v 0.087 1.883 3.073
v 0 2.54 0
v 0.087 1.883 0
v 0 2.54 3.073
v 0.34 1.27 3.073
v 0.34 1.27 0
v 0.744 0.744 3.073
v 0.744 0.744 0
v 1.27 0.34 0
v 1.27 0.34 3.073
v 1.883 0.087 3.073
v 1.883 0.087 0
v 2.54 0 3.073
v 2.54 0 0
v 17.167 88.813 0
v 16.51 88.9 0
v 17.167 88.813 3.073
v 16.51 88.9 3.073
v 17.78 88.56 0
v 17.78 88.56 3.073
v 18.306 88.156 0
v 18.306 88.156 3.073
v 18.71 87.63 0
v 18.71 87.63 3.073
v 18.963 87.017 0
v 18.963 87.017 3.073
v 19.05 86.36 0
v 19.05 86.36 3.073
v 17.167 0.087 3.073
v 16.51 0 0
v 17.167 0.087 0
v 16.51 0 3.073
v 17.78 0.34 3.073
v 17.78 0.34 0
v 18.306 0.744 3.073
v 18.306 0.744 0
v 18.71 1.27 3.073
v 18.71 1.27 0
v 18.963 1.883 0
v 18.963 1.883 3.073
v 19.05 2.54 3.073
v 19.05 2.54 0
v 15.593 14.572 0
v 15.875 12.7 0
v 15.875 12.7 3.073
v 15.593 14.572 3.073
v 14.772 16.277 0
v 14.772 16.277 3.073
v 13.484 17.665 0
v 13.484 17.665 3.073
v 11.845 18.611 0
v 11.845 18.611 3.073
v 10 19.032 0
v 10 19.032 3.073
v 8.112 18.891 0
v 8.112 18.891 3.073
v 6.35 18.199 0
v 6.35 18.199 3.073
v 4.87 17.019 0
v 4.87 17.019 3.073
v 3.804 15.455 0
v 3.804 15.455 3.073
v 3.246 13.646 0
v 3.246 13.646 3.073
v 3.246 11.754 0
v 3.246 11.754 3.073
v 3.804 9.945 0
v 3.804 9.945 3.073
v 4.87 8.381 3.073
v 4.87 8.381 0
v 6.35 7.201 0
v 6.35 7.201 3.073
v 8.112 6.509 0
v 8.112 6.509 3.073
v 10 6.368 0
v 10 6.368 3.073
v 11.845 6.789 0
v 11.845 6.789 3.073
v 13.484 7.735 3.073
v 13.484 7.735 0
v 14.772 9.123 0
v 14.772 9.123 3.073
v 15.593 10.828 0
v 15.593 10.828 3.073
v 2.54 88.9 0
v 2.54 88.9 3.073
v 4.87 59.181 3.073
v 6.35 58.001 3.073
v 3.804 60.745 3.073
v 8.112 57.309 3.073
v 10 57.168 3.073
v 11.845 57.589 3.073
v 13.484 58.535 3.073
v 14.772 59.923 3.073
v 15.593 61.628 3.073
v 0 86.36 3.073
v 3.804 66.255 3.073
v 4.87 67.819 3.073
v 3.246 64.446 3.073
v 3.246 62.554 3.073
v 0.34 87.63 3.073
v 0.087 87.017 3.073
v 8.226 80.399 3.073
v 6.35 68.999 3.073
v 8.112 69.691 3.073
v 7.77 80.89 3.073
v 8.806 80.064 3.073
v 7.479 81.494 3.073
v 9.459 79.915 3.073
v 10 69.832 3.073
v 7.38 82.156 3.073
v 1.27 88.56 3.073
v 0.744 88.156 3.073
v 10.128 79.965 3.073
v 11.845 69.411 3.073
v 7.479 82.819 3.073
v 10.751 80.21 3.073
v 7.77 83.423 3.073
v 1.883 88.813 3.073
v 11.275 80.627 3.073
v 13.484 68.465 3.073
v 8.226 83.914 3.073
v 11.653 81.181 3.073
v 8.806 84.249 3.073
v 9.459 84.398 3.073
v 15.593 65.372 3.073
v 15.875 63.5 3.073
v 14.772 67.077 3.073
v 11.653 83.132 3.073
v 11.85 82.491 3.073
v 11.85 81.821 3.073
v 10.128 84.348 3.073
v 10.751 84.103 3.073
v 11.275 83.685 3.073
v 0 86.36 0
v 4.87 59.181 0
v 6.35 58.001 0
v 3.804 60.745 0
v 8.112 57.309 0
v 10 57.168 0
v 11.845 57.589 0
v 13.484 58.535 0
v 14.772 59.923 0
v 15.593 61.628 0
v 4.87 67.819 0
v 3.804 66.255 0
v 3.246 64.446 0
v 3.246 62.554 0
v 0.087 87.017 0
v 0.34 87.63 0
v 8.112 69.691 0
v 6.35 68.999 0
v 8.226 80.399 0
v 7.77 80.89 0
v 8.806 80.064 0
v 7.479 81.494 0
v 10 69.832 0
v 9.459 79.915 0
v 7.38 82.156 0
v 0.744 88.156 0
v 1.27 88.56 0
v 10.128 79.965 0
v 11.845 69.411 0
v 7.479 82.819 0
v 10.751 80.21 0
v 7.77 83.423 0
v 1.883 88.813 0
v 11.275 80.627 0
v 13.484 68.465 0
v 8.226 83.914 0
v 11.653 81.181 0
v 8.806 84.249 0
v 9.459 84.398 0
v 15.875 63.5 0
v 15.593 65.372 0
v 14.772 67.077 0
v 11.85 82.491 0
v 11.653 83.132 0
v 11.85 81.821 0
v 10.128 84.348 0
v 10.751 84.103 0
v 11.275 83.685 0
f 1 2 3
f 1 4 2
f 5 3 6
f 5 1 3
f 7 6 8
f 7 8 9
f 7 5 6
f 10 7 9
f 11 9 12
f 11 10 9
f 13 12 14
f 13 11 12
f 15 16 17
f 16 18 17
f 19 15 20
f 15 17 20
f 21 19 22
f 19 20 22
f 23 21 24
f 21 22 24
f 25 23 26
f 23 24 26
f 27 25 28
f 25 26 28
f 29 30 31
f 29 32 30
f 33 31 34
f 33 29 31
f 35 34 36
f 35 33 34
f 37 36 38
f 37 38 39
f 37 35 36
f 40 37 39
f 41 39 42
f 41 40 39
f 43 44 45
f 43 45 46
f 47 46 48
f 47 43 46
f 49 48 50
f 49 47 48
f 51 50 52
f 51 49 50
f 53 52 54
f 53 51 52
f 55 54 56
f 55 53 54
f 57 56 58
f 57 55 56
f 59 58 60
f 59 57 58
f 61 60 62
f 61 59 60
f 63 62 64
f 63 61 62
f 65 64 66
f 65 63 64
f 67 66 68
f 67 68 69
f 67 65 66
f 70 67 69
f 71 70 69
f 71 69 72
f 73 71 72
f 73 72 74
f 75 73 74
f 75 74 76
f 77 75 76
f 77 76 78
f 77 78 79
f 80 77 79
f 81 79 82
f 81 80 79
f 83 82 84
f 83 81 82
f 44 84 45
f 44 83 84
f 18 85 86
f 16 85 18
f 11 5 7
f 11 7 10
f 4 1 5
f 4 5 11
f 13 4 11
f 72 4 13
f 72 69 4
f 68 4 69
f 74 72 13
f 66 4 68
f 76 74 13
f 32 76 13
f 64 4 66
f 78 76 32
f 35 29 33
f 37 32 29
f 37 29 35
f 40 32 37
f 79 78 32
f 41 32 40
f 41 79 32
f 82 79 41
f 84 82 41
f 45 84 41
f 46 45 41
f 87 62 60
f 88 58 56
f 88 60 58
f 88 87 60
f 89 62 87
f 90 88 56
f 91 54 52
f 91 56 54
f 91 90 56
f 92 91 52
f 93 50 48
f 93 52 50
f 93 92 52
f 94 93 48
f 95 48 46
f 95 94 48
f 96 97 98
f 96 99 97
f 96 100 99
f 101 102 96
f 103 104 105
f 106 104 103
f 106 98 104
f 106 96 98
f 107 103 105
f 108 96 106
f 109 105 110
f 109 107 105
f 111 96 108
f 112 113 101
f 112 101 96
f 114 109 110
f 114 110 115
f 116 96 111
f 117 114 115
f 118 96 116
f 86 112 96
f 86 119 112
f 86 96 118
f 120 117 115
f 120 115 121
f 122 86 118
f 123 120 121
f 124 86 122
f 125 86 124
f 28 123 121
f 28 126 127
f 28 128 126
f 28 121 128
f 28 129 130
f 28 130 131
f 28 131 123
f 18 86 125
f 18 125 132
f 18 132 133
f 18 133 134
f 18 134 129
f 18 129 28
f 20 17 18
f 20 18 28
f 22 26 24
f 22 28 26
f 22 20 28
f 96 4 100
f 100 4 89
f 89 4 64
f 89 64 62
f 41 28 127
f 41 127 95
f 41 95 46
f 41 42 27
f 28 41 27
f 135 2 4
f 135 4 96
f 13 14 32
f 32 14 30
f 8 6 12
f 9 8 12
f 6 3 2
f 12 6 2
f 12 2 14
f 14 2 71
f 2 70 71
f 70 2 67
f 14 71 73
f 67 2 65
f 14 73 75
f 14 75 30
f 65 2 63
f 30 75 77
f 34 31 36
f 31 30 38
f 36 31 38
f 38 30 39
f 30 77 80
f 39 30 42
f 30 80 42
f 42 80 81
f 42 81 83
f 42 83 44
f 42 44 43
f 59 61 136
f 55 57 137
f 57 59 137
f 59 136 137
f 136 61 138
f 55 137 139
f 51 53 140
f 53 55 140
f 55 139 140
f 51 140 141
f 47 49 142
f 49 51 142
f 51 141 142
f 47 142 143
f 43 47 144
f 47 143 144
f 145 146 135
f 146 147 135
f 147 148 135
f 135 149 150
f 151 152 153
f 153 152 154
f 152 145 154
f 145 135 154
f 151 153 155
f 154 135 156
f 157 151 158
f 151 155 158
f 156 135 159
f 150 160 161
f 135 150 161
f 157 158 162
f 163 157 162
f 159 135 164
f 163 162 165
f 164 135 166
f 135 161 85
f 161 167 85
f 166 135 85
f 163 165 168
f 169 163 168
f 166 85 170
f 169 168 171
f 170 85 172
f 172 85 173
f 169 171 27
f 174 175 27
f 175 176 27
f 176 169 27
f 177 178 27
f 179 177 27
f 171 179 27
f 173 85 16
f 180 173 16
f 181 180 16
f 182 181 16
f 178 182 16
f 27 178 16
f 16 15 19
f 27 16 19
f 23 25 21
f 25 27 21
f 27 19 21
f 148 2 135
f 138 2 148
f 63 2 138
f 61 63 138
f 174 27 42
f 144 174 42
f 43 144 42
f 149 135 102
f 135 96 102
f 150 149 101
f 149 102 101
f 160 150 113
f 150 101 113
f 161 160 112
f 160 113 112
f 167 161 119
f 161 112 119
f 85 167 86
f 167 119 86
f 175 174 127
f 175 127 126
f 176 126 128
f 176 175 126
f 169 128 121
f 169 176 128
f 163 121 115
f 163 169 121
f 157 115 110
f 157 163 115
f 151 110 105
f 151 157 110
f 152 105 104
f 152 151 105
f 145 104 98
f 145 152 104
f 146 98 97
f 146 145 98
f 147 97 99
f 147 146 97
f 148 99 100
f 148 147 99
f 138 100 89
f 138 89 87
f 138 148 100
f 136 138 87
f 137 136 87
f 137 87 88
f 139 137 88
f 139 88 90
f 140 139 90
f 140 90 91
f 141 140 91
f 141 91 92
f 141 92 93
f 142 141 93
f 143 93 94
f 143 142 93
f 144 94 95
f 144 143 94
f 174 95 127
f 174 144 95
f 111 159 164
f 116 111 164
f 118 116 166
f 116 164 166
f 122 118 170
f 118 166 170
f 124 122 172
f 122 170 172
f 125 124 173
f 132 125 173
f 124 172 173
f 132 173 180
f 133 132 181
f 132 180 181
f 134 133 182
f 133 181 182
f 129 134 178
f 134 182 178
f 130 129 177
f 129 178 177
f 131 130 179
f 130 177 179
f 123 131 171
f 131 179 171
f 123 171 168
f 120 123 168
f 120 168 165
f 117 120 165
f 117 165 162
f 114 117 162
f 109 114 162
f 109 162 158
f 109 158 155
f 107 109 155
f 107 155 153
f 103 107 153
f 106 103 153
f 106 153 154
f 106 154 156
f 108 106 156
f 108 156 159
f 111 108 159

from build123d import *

# Parameters (mm, degrees)
SKETCH1_W             = 19.05
SKETCH1_H             = 88.9
SKETCH1_R             = 6.35
BOSS_EXTRUDE1_DEPTH   = 3.0734
F_8_CLEARANCE_HOLE1_D = 4.4958
FILLET1_R             = 2.54


with BuildPart() as part:
    # Sketch1 → Boss-Extrude1 (new body)
    with BuildSketch(Plane.XY):
        with Locations((9.525, 44.45)):
            Rectangle(SKETCH1_W, SKETCH1_H)
        with Locations((9.525, 12.7)):
            Circle(SKETCH1_R, mode=Mode.SUBTRACT)
        with Locations((9.525, 63.5)):
            Circle(SKETCH1_R, mode=Mode.SUBTRACT)
    extrude(amount=BOSS_EXTRUDE1_DEPTH)

    # #8 Clearance Hole1 (through all)
    with Locations(Plane.XY.offset(3.0734)):
        with Locations((9.627458059, 82.1563)):
            Hole(F_8_CLEARANCE_HOLE1_D / 2)

    # Fillet1
    fillet1_edges = [part.edges().sort_by_distance(p)[0] for p in [
        (0, 88.9, 1.5367),
        (19.05, 88.9, 1.5367),
        (19.05, 0, 1.5367),
        (0, 0, 1.5367),
    ]]
    fillet(fillet1_edges, radius=FILLET1_R)


solid = part.part
